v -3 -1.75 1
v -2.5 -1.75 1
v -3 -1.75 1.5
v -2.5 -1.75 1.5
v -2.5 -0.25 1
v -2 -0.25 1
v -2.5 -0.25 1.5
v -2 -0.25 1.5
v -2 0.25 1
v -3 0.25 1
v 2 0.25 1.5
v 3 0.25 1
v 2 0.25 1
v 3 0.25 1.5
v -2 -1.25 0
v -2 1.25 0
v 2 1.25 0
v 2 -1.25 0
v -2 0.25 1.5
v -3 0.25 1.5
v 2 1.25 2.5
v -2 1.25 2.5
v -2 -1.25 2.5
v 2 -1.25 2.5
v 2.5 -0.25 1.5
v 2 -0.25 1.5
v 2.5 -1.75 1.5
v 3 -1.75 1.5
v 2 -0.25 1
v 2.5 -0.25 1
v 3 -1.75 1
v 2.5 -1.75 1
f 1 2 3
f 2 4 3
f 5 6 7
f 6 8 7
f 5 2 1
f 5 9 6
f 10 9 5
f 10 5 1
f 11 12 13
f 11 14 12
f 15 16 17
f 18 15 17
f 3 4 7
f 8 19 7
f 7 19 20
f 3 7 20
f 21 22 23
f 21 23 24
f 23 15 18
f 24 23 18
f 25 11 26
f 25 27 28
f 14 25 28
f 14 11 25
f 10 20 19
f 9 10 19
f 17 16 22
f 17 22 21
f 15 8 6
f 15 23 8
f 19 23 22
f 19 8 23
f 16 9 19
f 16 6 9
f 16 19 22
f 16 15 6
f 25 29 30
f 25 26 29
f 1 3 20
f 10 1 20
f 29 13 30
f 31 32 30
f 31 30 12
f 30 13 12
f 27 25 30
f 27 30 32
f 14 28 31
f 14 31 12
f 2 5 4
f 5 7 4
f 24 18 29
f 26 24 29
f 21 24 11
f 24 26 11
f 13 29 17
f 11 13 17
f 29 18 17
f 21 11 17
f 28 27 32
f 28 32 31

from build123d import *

# Parameters (mm, degrees)
SKETCH99_W               = 4
SKETCH99_H               = 2.5
BOSS_EXTRUDE5_DEPTH      = 2.5
BOSS_EXTRUDE6_DEPTH      = 0.25
BOSS_EXTRUDE6_DEPTH_BACK = 0.25


with BuildPart() as part:
    # Sketch99 → Boss-Extrude5 (new body)
    with BuildSketch(Plane.XY):
        Rectangle(SKETCH99_W, SKETCH99_H)
    extrude(amount=BOSS_EXTRUDE5_DEPTH)

    # Sketch100 → Boss-Extrude6 (add, two sides)
    with BuildSketch(Plane.XY.offset(1.25)) as boss_extrude6_sk:
        Polygon((2, 0.25), (2, -0.25), (2.5, -0.25), (2.5, -1.75), (3, -1.75), (3, -0.25), (3, 0.25), align=None)
        Polygon((-2.5, -0.25), (-2.5, -1.75), (-3, -1.75), (-3, 0.25), (-2, 0.25), (-2, -0.25), align=None)
    extrude(amount=BOSS_EXTRUDE6_DEPTH)
    extrude(boss_extrude6_sk.sketch, amount=-BOSS_EXTRUDE6_DEPTH_BACK)


solid = part.part
